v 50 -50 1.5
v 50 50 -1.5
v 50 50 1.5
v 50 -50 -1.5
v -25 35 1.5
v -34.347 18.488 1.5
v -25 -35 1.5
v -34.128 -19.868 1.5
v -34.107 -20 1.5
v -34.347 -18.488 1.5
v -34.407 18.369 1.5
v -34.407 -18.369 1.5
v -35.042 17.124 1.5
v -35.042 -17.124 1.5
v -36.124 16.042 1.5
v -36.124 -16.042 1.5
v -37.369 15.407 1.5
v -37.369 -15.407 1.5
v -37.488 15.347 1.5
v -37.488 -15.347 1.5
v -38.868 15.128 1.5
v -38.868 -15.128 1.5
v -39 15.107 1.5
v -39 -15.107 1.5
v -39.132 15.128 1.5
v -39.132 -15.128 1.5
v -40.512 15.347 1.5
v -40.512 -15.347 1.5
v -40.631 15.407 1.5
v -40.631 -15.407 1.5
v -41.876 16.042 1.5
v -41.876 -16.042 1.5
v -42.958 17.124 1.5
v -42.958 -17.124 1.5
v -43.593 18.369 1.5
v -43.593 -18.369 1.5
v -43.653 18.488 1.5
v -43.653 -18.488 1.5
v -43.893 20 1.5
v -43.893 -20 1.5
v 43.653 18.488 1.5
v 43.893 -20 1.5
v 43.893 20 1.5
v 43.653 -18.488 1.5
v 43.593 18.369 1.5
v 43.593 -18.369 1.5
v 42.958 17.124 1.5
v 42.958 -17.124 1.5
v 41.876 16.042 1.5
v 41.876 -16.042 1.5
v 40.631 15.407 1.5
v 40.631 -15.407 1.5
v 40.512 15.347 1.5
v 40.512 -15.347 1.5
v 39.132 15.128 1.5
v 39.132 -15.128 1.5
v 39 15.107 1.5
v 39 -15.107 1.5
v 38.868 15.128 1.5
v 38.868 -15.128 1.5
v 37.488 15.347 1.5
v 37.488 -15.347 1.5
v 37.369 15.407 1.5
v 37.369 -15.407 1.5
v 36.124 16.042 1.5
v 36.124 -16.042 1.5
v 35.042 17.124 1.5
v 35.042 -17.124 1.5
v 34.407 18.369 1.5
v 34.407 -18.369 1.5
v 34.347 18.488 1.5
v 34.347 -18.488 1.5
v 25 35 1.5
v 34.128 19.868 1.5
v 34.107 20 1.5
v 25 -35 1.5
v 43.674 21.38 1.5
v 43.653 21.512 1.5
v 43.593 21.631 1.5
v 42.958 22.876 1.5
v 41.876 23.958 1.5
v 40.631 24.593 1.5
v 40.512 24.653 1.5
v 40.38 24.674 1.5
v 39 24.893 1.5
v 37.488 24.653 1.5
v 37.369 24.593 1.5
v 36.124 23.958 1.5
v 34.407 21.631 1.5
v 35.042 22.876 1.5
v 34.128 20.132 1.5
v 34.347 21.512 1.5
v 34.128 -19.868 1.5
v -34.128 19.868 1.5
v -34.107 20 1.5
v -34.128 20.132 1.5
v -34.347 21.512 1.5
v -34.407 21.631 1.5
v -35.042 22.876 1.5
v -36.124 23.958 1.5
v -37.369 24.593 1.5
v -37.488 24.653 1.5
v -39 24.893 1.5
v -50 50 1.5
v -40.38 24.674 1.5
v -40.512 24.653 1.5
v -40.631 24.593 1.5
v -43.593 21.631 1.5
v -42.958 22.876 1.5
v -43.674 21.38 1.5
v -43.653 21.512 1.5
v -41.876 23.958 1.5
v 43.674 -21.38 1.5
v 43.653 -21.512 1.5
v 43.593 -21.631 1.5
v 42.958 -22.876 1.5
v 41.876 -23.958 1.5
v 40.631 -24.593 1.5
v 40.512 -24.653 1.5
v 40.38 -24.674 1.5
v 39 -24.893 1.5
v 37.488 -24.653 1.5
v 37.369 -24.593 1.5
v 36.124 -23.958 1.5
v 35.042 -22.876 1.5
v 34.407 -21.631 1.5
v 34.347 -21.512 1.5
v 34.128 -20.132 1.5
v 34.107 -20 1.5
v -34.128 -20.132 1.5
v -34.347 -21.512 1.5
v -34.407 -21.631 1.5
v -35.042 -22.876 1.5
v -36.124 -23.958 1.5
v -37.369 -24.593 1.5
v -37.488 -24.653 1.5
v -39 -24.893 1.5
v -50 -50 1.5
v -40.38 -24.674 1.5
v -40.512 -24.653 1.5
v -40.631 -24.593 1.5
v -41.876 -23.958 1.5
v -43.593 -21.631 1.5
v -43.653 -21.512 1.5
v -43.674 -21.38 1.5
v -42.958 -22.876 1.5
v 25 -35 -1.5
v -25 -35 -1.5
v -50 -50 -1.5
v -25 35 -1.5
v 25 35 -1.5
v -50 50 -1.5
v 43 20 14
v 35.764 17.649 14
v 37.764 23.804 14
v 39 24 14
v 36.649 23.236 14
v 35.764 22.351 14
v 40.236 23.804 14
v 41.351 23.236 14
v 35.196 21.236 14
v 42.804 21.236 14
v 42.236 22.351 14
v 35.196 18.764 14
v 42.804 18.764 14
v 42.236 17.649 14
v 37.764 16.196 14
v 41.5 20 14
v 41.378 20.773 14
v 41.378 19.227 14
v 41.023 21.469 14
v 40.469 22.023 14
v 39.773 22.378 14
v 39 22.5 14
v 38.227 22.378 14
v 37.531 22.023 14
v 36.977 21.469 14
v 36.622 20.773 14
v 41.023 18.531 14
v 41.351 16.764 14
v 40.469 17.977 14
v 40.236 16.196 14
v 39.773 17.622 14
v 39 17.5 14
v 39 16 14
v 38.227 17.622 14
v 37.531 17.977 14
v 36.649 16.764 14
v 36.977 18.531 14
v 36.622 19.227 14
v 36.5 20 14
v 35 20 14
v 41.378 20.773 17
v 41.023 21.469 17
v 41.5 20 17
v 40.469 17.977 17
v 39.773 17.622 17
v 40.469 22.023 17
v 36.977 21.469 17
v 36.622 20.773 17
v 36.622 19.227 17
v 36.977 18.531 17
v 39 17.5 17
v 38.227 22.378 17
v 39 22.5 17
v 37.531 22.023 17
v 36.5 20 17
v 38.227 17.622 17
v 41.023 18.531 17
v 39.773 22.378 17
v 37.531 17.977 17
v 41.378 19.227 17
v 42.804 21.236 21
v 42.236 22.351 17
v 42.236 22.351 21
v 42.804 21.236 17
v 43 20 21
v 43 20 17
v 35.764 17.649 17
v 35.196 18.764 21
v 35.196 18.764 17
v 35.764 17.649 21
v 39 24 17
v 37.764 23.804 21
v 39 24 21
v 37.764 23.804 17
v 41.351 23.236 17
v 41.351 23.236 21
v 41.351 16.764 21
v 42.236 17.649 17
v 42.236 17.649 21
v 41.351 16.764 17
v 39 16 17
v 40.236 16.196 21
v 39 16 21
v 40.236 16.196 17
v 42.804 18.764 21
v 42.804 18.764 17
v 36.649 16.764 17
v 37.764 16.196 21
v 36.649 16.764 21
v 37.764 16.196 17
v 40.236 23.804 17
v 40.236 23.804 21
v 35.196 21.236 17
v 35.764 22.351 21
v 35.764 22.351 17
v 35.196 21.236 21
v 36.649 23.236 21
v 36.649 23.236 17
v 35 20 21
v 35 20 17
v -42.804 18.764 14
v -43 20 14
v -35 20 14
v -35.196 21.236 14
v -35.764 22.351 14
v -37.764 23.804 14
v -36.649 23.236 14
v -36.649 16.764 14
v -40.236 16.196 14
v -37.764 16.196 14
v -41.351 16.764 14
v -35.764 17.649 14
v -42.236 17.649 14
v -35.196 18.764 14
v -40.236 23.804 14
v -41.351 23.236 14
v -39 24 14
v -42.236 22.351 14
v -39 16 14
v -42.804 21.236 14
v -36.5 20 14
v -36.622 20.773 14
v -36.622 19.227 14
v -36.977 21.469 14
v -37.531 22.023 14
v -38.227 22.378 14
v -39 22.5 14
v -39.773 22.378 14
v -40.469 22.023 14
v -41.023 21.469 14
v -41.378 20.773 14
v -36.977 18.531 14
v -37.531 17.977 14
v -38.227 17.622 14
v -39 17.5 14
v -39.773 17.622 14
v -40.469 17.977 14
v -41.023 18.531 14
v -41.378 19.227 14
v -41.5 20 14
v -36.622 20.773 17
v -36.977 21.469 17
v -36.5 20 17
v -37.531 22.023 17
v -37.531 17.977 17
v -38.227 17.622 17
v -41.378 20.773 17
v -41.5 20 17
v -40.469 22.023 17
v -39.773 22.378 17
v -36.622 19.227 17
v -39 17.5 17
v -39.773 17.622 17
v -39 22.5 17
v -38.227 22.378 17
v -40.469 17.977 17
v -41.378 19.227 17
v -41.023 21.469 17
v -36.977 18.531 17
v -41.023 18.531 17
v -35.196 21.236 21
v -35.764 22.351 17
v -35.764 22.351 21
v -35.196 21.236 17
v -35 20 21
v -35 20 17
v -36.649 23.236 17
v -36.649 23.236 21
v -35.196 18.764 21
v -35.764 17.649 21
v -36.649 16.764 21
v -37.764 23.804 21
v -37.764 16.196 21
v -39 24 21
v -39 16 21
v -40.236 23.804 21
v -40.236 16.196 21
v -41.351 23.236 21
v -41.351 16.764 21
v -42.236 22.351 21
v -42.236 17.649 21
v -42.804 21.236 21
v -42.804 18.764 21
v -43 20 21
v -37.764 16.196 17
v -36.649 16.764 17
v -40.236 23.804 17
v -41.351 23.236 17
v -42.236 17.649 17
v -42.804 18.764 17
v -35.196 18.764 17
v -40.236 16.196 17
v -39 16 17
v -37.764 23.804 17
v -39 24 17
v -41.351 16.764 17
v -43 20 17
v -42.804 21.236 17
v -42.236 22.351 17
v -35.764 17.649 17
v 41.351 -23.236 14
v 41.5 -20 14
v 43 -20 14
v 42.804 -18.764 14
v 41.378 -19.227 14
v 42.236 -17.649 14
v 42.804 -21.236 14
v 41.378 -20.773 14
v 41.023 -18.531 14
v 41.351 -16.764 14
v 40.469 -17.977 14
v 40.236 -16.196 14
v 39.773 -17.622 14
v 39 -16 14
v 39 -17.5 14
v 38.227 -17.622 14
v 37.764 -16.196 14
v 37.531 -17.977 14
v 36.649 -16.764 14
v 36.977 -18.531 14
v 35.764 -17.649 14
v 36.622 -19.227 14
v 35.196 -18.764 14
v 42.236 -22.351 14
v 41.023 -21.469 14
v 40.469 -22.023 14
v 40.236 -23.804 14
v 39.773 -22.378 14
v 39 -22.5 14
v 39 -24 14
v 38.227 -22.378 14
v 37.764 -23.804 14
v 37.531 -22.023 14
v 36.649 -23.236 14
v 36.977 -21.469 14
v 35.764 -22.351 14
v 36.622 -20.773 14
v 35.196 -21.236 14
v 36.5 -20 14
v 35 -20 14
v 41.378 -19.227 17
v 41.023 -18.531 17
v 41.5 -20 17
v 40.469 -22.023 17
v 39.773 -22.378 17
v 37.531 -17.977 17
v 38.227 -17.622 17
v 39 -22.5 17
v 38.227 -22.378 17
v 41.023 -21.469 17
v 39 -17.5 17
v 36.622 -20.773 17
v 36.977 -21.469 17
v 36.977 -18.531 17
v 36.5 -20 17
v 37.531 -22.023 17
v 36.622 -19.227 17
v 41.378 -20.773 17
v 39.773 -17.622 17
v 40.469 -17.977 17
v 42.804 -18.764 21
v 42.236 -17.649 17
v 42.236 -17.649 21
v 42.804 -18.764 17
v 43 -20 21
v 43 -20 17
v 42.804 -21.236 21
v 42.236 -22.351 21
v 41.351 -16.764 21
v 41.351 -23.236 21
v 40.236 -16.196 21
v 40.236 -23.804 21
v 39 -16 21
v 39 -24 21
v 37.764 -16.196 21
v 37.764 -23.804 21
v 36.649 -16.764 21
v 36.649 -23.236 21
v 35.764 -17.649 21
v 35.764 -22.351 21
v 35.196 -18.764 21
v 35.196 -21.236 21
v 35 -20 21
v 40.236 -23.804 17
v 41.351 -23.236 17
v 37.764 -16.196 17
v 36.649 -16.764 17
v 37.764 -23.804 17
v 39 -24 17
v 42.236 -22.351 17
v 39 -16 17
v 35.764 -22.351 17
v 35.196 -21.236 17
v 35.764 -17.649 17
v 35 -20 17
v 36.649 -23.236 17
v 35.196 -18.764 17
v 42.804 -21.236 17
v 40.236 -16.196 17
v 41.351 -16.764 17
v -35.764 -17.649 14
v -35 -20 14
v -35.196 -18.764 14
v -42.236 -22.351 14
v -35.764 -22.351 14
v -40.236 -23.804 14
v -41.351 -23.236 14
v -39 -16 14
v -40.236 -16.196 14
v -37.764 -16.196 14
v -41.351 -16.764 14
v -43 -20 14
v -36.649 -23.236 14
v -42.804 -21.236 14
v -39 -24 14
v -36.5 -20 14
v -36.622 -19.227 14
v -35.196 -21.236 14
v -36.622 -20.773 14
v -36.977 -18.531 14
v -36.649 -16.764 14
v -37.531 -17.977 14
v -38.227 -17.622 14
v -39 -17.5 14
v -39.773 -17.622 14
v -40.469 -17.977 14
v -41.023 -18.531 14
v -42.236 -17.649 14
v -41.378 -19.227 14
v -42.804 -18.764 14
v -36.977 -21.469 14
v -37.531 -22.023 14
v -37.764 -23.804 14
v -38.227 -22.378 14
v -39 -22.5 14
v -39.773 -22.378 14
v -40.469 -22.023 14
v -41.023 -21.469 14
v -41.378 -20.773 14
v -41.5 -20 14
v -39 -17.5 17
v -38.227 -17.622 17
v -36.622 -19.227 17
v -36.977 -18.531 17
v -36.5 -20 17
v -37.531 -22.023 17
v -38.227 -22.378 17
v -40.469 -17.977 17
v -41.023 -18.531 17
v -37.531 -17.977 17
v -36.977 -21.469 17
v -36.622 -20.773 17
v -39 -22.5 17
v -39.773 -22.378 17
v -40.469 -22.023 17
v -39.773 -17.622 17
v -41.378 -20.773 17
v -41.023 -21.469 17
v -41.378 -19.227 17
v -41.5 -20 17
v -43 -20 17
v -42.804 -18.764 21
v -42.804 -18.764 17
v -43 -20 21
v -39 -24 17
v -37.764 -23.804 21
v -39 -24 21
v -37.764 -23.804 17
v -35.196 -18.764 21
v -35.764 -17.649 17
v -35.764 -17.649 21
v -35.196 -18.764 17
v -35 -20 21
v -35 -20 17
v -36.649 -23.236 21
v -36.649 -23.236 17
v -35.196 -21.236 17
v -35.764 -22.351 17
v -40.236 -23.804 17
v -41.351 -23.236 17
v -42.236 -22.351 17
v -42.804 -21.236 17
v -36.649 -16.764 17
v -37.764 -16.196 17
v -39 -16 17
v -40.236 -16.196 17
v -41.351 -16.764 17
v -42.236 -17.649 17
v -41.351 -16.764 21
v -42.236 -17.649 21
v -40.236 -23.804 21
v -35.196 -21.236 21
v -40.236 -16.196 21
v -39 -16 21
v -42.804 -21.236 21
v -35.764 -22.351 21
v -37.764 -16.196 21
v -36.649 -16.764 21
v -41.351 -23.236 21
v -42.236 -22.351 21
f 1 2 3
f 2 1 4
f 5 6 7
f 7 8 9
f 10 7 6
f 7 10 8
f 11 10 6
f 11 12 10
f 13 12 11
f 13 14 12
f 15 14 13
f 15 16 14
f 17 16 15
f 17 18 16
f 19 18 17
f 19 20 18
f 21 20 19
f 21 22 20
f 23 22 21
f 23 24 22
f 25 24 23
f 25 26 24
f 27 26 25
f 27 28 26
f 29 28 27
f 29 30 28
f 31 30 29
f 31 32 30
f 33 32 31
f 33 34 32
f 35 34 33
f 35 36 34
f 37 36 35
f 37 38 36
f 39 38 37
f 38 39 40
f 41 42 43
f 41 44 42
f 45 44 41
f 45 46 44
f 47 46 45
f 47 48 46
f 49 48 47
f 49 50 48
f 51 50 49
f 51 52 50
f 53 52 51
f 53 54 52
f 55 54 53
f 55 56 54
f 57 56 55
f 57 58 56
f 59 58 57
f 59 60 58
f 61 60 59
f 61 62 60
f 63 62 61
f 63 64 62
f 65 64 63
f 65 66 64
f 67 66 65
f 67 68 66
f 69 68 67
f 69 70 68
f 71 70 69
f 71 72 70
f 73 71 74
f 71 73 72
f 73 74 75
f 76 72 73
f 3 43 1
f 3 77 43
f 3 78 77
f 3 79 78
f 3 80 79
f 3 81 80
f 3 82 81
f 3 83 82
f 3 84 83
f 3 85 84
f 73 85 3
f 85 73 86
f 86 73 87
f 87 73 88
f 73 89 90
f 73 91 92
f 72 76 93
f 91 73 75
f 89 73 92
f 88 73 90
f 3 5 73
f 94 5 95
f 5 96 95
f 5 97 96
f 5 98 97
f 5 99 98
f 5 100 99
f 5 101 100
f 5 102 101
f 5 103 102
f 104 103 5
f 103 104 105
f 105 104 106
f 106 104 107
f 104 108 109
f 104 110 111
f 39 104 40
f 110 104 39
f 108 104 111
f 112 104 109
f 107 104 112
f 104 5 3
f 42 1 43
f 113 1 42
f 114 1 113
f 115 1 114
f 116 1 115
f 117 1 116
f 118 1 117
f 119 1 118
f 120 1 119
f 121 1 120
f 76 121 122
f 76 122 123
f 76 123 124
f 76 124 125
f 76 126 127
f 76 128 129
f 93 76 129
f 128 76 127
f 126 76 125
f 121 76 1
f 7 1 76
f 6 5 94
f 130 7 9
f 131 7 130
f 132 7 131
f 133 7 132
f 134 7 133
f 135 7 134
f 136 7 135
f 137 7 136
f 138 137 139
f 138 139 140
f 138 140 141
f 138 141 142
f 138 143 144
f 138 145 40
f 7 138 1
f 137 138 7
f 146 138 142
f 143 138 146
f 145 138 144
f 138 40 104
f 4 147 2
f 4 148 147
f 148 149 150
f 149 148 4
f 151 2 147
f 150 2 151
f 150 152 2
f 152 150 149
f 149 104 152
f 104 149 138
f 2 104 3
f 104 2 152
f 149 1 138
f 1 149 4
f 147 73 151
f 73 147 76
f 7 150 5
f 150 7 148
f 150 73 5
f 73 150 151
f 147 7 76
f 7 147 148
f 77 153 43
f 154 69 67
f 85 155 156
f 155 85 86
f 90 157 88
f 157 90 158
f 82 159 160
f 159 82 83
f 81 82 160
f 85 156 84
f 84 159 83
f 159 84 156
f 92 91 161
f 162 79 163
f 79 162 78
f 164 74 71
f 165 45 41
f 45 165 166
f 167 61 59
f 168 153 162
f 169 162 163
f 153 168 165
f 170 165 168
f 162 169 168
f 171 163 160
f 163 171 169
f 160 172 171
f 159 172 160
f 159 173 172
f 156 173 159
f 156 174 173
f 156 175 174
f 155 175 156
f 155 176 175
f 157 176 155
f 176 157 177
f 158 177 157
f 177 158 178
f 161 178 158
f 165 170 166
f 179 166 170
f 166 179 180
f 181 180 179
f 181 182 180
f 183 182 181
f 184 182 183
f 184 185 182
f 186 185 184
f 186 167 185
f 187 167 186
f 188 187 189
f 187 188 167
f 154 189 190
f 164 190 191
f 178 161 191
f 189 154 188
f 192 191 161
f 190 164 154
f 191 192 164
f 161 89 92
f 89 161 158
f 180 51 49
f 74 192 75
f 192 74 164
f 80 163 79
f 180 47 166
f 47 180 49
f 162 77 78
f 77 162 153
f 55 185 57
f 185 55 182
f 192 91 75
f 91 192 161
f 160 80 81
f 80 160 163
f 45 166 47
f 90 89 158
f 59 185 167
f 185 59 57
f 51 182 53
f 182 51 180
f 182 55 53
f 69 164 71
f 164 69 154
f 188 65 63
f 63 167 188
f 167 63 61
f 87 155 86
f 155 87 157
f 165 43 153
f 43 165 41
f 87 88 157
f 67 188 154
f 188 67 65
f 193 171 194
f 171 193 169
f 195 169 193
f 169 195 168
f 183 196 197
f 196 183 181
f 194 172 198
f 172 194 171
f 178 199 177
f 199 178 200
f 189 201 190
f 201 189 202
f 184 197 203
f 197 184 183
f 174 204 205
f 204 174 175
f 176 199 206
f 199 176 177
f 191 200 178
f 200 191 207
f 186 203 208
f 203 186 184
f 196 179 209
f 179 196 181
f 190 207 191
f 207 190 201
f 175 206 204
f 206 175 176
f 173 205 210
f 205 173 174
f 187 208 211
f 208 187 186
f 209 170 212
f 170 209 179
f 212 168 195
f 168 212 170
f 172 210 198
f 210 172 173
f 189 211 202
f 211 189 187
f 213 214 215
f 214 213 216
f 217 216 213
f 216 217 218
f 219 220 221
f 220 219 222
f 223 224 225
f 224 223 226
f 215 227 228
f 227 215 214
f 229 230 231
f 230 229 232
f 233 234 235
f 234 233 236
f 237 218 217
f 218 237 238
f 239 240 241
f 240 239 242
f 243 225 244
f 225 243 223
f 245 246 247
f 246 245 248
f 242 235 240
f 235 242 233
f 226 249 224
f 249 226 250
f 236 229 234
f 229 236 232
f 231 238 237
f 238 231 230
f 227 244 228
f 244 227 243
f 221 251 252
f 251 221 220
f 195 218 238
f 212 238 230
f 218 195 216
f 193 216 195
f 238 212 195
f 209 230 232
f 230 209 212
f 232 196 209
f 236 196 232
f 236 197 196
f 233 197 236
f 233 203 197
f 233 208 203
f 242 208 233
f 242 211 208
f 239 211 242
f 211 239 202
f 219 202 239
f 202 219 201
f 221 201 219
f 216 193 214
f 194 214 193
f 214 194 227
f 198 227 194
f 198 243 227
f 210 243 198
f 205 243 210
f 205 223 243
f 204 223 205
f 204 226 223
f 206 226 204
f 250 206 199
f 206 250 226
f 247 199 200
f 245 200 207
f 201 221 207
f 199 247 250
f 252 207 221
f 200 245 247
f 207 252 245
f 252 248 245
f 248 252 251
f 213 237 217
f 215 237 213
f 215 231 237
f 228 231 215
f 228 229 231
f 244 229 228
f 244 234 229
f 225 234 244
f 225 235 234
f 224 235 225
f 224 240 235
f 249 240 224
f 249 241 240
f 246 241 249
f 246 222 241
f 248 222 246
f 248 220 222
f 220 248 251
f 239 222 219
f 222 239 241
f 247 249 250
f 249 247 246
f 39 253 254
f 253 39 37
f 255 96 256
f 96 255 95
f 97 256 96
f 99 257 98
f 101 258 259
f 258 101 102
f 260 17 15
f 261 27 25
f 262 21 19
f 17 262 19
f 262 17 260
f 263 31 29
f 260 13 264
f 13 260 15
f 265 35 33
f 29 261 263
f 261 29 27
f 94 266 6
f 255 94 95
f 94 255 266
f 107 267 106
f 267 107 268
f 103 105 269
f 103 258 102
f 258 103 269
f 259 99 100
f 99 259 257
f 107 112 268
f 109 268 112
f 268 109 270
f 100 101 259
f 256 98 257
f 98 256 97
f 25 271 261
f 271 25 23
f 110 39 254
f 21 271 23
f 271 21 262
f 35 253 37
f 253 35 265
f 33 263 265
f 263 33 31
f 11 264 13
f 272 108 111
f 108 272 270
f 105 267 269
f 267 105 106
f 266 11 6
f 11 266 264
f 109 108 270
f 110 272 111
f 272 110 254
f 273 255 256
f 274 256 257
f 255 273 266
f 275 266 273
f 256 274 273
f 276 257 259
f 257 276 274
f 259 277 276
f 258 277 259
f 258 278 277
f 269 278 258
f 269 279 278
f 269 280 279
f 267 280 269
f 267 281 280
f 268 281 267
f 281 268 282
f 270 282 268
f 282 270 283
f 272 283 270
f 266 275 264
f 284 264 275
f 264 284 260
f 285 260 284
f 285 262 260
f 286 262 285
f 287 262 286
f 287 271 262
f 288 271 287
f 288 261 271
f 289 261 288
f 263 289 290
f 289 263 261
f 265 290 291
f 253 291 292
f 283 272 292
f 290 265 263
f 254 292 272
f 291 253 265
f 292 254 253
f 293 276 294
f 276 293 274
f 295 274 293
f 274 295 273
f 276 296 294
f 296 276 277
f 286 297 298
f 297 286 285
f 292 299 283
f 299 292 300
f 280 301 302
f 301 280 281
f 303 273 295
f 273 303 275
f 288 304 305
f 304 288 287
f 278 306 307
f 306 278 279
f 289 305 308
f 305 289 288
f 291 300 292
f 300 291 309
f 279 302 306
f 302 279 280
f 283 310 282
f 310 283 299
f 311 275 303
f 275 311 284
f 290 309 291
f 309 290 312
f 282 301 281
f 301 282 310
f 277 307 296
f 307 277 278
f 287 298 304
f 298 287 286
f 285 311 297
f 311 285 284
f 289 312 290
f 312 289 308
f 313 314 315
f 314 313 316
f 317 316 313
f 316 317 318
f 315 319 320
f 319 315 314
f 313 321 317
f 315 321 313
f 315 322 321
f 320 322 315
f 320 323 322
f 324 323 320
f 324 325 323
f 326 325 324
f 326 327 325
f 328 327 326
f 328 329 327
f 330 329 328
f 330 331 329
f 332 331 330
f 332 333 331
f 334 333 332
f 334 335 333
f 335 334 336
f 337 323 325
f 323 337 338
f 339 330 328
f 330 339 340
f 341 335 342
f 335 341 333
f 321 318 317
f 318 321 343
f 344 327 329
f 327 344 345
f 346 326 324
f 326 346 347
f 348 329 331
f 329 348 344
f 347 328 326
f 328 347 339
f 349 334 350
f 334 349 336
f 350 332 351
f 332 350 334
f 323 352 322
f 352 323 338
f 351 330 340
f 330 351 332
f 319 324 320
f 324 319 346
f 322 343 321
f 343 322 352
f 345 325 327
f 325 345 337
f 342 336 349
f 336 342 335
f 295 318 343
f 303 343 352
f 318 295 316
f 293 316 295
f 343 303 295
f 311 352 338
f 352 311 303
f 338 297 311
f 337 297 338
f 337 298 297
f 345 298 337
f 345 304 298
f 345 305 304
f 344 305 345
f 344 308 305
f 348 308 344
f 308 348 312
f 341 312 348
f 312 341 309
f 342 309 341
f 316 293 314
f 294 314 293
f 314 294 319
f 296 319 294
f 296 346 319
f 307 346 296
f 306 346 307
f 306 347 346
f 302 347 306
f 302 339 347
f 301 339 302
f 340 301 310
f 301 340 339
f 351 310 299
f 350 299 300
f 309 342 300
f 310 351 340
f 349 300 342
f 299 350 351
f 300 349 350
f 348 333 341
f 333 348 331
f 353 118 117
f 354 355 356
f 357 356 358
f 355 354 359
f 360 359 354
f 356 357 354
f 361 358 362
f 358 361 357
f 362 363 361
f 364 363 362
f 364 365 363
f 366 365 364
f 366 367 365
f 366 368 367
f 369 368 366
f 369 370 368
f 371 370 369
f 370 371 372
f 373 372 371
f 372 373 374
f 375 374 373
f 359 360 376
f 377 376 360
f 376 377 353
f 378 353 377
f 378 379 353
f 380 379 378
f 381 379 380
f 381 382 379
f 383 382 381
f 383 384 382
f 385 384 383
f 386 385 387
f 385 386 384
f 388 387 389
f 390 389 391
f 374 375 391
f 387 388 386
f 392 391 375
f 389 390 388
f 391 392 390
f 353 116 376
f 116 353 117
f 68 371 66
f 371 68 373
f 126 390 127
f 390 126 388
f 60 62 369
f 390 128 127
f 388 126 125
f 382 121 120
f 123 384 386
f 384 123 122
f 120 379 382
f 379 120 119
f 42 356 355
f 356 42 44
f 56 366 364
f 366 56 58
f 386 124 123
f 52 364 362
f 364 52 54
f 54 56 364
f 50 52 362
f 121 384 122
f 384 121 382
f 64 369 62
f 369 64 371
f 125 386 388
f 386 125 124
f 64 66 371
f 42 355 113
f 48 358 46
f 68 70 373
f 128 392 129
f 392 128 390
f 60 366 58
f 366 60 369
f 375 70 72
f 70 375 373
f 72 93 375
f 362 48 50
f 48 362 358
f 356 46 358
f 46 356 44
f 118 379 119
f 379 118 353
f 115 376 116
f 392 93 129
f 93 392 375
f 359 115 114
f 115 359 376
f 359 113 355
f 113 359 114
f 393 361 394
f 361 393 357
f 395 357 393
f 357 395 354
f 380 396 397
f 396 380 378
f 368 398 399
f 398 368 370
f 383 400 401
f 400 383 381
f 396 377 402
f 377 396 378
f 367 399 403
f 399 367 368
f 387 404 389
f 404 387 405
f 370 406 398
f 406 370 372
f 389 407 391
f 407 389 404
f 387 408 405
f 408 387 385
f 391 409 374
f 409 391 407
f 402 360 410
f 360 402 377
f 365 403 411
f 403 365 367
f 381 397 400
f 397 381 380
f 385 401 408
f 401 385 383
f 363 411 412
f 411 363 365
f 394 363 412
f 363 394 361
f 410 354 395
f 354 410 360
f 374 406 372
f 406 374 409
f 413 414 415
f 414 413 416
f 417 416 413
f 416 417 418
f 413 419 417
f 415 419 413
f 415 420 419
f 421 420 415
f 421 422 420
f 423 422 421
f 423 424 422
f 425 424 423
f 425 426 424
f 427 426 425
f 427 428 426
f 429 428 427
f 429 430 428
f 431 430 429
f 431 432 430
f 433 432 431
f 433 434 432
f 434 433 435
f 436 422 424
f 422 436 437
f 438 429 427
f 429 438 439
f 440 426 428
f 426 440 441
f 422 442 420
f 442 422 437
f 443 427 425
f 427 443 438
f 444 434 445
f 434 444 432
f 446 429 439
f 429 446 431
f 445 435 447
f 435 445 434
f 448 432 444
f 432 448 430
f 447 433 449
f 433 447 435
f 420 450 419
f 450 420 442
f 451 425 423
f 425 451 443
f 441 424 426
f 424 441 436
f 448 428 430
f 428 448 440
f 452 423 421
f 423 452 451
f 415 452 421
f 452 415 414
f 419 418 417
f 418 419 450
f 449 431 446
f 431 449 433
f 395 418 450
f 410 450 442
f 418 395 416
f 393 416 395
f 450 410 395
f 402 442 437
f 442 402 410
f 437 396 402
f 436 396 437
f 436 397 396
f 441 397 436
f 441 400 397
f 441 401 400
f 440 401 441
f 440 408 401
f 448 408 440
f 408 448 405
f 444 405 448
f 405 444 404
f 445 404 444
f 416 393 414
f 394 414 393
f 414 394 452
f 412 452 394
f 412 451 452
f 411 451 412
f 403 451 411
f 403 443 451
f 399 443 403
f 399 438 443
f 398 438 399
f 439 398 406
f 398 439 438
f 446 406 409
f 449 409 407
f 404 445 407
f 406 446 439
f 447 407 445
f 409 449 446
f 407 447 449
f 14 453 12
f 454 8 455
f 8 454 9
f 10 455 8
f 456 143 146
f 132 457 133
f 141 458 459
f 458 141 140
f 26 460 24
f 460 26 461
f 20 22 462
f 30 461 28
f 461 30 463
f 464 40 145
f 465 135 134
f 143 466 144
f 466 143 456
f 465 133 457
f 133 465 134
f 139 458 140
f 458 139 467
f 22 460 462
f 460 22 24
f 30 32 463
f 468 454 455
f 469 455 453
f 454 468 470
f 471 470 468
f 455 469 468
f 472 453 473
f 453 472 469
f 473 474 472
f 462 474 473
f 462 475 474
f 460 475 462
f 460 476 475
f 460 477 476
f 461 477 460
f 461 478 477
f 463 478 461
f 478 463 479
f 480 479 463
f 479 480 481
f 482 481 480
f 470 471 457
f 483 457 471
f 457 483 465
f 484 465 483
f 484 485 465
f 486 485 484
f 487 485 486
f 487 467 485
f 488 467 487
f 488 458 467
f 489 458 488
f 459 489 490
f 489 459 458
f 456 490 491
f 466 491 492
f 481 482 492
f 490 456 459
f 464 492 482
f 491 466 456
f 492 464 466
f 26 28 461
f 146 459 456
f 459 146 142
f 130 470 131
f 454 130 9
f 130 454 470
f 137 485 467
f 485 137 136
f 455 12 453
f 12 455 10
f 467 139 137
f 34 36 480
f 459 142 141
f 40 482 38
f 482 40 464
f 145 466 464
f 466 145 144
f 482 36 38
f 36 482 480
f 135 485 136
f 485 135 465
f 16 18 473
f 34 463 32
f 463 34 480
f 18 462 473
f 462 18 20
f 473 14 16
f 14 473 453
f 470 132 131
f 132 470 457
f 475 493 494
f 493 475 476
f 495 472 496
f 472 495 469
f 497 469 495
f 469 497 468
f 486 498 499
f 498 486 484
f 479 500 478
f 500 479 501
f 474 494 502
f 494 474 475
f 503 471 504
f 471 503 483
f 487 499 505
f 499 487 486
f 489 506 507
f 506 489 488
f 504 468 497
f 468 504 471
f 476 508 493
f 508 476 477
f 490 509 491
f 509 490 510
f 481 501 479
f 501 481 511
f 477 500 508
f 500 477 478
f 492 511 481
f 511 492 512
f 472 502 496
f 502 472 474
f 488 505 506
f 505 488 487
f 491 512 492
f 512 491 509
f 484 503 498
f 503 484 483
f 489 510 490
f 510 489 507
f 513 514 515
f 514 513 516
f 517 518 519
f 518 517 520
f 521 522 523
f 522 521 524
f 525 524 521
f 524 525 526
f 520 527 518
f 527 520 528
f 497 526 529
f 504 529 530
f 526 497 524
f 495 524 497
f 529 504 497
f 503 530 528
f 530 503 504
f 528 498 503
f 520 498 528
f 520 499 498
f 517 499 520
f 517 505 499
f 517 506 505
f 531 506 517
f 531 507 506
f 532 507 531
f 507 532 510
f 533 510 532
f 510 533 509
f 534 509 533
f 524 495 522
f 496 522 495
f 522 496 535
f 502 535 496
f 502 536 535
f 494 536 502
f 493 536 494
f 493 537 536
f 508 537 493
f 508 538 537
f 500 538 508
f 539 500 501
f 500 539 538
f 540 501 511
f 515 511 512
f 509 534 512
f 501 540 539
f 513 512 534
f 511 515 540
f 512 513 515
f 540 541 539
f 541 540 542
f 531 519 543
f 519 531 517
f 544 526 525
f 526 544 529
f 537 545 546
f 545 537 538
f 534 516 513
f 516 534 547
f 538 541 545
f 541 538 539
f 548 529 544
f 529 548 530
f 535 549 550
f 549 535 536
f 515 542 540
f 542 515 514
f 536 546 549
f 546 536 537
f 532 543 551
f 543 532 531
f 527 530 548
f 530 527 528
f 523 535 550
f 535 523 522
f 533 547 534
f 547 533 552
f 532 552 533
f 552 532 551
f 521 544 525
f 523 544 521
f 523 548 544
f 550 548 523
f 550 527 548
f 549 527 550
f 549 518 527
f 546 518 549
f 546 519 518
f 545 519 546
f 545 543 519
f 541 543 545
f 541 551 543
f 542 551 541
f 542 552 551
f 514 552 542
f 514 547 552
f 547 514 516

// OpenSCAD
screw_radius = 2.8 / 2;

panel_width = 100;
panel_thickness = 3;

//mount_offset = 32;


outside_cylinder_cutout_offset = 100;
outside_cylinder_cutout_radius = 95;

outside_chop_offset = 55;

inner_mount_hole_radius = 36.1;

mount_hole_y_offset = 9.8;
outside_mount_hole_offset = 11.7;
inside_mount_hole_offset = 8;

antenna_hole_diameter = 6.75;
antenna_hole_radius = antenna_hole_diameter / 2;

mount_offset = inner_mount_hole_radius + mount_hole_y_offset;

module mount(x, y) {
		translate([x, y, 7])   cylinder(r=4, 14, 5, $fn=20,center=true);
		translate([x, y, 16])   cylinder(r=2.5, 4, $fn=20,center=true);
		translate([x, y, 19])   cylinder(r=4, 4, $fn=20,center=true);
}

module top_plate() {
	union() {

		difference() {
			cube([panel_width,panel_width,panel_thickness],center=true);

			rotate([0,0,0]) cube([50,70,panel_thickness], center=true);
		}


//		cylinder(r=33, panel_thickness, center=true);
	//	translate([outside_cylinder_cutout_offset,-outside_cylinder_cutout_offset,0]) cylinder(r=outside_cylinder_cutout_radius, panel_thickness, $fn=50, center=true);
	//	translate([-outside_cylinder_cutout_offset,-outside_cylinder_cutout_offset,0]) cylinder(r=outside_cylinder_cutout_radius, panel_thickness, $fn=50, center=true);

	rotate([0,0,0]){
		mount(39,20);
		mount(-39,20);
		mount(39,-20);
		mount(-39,-20);
		}
	}
}

top_plate();
